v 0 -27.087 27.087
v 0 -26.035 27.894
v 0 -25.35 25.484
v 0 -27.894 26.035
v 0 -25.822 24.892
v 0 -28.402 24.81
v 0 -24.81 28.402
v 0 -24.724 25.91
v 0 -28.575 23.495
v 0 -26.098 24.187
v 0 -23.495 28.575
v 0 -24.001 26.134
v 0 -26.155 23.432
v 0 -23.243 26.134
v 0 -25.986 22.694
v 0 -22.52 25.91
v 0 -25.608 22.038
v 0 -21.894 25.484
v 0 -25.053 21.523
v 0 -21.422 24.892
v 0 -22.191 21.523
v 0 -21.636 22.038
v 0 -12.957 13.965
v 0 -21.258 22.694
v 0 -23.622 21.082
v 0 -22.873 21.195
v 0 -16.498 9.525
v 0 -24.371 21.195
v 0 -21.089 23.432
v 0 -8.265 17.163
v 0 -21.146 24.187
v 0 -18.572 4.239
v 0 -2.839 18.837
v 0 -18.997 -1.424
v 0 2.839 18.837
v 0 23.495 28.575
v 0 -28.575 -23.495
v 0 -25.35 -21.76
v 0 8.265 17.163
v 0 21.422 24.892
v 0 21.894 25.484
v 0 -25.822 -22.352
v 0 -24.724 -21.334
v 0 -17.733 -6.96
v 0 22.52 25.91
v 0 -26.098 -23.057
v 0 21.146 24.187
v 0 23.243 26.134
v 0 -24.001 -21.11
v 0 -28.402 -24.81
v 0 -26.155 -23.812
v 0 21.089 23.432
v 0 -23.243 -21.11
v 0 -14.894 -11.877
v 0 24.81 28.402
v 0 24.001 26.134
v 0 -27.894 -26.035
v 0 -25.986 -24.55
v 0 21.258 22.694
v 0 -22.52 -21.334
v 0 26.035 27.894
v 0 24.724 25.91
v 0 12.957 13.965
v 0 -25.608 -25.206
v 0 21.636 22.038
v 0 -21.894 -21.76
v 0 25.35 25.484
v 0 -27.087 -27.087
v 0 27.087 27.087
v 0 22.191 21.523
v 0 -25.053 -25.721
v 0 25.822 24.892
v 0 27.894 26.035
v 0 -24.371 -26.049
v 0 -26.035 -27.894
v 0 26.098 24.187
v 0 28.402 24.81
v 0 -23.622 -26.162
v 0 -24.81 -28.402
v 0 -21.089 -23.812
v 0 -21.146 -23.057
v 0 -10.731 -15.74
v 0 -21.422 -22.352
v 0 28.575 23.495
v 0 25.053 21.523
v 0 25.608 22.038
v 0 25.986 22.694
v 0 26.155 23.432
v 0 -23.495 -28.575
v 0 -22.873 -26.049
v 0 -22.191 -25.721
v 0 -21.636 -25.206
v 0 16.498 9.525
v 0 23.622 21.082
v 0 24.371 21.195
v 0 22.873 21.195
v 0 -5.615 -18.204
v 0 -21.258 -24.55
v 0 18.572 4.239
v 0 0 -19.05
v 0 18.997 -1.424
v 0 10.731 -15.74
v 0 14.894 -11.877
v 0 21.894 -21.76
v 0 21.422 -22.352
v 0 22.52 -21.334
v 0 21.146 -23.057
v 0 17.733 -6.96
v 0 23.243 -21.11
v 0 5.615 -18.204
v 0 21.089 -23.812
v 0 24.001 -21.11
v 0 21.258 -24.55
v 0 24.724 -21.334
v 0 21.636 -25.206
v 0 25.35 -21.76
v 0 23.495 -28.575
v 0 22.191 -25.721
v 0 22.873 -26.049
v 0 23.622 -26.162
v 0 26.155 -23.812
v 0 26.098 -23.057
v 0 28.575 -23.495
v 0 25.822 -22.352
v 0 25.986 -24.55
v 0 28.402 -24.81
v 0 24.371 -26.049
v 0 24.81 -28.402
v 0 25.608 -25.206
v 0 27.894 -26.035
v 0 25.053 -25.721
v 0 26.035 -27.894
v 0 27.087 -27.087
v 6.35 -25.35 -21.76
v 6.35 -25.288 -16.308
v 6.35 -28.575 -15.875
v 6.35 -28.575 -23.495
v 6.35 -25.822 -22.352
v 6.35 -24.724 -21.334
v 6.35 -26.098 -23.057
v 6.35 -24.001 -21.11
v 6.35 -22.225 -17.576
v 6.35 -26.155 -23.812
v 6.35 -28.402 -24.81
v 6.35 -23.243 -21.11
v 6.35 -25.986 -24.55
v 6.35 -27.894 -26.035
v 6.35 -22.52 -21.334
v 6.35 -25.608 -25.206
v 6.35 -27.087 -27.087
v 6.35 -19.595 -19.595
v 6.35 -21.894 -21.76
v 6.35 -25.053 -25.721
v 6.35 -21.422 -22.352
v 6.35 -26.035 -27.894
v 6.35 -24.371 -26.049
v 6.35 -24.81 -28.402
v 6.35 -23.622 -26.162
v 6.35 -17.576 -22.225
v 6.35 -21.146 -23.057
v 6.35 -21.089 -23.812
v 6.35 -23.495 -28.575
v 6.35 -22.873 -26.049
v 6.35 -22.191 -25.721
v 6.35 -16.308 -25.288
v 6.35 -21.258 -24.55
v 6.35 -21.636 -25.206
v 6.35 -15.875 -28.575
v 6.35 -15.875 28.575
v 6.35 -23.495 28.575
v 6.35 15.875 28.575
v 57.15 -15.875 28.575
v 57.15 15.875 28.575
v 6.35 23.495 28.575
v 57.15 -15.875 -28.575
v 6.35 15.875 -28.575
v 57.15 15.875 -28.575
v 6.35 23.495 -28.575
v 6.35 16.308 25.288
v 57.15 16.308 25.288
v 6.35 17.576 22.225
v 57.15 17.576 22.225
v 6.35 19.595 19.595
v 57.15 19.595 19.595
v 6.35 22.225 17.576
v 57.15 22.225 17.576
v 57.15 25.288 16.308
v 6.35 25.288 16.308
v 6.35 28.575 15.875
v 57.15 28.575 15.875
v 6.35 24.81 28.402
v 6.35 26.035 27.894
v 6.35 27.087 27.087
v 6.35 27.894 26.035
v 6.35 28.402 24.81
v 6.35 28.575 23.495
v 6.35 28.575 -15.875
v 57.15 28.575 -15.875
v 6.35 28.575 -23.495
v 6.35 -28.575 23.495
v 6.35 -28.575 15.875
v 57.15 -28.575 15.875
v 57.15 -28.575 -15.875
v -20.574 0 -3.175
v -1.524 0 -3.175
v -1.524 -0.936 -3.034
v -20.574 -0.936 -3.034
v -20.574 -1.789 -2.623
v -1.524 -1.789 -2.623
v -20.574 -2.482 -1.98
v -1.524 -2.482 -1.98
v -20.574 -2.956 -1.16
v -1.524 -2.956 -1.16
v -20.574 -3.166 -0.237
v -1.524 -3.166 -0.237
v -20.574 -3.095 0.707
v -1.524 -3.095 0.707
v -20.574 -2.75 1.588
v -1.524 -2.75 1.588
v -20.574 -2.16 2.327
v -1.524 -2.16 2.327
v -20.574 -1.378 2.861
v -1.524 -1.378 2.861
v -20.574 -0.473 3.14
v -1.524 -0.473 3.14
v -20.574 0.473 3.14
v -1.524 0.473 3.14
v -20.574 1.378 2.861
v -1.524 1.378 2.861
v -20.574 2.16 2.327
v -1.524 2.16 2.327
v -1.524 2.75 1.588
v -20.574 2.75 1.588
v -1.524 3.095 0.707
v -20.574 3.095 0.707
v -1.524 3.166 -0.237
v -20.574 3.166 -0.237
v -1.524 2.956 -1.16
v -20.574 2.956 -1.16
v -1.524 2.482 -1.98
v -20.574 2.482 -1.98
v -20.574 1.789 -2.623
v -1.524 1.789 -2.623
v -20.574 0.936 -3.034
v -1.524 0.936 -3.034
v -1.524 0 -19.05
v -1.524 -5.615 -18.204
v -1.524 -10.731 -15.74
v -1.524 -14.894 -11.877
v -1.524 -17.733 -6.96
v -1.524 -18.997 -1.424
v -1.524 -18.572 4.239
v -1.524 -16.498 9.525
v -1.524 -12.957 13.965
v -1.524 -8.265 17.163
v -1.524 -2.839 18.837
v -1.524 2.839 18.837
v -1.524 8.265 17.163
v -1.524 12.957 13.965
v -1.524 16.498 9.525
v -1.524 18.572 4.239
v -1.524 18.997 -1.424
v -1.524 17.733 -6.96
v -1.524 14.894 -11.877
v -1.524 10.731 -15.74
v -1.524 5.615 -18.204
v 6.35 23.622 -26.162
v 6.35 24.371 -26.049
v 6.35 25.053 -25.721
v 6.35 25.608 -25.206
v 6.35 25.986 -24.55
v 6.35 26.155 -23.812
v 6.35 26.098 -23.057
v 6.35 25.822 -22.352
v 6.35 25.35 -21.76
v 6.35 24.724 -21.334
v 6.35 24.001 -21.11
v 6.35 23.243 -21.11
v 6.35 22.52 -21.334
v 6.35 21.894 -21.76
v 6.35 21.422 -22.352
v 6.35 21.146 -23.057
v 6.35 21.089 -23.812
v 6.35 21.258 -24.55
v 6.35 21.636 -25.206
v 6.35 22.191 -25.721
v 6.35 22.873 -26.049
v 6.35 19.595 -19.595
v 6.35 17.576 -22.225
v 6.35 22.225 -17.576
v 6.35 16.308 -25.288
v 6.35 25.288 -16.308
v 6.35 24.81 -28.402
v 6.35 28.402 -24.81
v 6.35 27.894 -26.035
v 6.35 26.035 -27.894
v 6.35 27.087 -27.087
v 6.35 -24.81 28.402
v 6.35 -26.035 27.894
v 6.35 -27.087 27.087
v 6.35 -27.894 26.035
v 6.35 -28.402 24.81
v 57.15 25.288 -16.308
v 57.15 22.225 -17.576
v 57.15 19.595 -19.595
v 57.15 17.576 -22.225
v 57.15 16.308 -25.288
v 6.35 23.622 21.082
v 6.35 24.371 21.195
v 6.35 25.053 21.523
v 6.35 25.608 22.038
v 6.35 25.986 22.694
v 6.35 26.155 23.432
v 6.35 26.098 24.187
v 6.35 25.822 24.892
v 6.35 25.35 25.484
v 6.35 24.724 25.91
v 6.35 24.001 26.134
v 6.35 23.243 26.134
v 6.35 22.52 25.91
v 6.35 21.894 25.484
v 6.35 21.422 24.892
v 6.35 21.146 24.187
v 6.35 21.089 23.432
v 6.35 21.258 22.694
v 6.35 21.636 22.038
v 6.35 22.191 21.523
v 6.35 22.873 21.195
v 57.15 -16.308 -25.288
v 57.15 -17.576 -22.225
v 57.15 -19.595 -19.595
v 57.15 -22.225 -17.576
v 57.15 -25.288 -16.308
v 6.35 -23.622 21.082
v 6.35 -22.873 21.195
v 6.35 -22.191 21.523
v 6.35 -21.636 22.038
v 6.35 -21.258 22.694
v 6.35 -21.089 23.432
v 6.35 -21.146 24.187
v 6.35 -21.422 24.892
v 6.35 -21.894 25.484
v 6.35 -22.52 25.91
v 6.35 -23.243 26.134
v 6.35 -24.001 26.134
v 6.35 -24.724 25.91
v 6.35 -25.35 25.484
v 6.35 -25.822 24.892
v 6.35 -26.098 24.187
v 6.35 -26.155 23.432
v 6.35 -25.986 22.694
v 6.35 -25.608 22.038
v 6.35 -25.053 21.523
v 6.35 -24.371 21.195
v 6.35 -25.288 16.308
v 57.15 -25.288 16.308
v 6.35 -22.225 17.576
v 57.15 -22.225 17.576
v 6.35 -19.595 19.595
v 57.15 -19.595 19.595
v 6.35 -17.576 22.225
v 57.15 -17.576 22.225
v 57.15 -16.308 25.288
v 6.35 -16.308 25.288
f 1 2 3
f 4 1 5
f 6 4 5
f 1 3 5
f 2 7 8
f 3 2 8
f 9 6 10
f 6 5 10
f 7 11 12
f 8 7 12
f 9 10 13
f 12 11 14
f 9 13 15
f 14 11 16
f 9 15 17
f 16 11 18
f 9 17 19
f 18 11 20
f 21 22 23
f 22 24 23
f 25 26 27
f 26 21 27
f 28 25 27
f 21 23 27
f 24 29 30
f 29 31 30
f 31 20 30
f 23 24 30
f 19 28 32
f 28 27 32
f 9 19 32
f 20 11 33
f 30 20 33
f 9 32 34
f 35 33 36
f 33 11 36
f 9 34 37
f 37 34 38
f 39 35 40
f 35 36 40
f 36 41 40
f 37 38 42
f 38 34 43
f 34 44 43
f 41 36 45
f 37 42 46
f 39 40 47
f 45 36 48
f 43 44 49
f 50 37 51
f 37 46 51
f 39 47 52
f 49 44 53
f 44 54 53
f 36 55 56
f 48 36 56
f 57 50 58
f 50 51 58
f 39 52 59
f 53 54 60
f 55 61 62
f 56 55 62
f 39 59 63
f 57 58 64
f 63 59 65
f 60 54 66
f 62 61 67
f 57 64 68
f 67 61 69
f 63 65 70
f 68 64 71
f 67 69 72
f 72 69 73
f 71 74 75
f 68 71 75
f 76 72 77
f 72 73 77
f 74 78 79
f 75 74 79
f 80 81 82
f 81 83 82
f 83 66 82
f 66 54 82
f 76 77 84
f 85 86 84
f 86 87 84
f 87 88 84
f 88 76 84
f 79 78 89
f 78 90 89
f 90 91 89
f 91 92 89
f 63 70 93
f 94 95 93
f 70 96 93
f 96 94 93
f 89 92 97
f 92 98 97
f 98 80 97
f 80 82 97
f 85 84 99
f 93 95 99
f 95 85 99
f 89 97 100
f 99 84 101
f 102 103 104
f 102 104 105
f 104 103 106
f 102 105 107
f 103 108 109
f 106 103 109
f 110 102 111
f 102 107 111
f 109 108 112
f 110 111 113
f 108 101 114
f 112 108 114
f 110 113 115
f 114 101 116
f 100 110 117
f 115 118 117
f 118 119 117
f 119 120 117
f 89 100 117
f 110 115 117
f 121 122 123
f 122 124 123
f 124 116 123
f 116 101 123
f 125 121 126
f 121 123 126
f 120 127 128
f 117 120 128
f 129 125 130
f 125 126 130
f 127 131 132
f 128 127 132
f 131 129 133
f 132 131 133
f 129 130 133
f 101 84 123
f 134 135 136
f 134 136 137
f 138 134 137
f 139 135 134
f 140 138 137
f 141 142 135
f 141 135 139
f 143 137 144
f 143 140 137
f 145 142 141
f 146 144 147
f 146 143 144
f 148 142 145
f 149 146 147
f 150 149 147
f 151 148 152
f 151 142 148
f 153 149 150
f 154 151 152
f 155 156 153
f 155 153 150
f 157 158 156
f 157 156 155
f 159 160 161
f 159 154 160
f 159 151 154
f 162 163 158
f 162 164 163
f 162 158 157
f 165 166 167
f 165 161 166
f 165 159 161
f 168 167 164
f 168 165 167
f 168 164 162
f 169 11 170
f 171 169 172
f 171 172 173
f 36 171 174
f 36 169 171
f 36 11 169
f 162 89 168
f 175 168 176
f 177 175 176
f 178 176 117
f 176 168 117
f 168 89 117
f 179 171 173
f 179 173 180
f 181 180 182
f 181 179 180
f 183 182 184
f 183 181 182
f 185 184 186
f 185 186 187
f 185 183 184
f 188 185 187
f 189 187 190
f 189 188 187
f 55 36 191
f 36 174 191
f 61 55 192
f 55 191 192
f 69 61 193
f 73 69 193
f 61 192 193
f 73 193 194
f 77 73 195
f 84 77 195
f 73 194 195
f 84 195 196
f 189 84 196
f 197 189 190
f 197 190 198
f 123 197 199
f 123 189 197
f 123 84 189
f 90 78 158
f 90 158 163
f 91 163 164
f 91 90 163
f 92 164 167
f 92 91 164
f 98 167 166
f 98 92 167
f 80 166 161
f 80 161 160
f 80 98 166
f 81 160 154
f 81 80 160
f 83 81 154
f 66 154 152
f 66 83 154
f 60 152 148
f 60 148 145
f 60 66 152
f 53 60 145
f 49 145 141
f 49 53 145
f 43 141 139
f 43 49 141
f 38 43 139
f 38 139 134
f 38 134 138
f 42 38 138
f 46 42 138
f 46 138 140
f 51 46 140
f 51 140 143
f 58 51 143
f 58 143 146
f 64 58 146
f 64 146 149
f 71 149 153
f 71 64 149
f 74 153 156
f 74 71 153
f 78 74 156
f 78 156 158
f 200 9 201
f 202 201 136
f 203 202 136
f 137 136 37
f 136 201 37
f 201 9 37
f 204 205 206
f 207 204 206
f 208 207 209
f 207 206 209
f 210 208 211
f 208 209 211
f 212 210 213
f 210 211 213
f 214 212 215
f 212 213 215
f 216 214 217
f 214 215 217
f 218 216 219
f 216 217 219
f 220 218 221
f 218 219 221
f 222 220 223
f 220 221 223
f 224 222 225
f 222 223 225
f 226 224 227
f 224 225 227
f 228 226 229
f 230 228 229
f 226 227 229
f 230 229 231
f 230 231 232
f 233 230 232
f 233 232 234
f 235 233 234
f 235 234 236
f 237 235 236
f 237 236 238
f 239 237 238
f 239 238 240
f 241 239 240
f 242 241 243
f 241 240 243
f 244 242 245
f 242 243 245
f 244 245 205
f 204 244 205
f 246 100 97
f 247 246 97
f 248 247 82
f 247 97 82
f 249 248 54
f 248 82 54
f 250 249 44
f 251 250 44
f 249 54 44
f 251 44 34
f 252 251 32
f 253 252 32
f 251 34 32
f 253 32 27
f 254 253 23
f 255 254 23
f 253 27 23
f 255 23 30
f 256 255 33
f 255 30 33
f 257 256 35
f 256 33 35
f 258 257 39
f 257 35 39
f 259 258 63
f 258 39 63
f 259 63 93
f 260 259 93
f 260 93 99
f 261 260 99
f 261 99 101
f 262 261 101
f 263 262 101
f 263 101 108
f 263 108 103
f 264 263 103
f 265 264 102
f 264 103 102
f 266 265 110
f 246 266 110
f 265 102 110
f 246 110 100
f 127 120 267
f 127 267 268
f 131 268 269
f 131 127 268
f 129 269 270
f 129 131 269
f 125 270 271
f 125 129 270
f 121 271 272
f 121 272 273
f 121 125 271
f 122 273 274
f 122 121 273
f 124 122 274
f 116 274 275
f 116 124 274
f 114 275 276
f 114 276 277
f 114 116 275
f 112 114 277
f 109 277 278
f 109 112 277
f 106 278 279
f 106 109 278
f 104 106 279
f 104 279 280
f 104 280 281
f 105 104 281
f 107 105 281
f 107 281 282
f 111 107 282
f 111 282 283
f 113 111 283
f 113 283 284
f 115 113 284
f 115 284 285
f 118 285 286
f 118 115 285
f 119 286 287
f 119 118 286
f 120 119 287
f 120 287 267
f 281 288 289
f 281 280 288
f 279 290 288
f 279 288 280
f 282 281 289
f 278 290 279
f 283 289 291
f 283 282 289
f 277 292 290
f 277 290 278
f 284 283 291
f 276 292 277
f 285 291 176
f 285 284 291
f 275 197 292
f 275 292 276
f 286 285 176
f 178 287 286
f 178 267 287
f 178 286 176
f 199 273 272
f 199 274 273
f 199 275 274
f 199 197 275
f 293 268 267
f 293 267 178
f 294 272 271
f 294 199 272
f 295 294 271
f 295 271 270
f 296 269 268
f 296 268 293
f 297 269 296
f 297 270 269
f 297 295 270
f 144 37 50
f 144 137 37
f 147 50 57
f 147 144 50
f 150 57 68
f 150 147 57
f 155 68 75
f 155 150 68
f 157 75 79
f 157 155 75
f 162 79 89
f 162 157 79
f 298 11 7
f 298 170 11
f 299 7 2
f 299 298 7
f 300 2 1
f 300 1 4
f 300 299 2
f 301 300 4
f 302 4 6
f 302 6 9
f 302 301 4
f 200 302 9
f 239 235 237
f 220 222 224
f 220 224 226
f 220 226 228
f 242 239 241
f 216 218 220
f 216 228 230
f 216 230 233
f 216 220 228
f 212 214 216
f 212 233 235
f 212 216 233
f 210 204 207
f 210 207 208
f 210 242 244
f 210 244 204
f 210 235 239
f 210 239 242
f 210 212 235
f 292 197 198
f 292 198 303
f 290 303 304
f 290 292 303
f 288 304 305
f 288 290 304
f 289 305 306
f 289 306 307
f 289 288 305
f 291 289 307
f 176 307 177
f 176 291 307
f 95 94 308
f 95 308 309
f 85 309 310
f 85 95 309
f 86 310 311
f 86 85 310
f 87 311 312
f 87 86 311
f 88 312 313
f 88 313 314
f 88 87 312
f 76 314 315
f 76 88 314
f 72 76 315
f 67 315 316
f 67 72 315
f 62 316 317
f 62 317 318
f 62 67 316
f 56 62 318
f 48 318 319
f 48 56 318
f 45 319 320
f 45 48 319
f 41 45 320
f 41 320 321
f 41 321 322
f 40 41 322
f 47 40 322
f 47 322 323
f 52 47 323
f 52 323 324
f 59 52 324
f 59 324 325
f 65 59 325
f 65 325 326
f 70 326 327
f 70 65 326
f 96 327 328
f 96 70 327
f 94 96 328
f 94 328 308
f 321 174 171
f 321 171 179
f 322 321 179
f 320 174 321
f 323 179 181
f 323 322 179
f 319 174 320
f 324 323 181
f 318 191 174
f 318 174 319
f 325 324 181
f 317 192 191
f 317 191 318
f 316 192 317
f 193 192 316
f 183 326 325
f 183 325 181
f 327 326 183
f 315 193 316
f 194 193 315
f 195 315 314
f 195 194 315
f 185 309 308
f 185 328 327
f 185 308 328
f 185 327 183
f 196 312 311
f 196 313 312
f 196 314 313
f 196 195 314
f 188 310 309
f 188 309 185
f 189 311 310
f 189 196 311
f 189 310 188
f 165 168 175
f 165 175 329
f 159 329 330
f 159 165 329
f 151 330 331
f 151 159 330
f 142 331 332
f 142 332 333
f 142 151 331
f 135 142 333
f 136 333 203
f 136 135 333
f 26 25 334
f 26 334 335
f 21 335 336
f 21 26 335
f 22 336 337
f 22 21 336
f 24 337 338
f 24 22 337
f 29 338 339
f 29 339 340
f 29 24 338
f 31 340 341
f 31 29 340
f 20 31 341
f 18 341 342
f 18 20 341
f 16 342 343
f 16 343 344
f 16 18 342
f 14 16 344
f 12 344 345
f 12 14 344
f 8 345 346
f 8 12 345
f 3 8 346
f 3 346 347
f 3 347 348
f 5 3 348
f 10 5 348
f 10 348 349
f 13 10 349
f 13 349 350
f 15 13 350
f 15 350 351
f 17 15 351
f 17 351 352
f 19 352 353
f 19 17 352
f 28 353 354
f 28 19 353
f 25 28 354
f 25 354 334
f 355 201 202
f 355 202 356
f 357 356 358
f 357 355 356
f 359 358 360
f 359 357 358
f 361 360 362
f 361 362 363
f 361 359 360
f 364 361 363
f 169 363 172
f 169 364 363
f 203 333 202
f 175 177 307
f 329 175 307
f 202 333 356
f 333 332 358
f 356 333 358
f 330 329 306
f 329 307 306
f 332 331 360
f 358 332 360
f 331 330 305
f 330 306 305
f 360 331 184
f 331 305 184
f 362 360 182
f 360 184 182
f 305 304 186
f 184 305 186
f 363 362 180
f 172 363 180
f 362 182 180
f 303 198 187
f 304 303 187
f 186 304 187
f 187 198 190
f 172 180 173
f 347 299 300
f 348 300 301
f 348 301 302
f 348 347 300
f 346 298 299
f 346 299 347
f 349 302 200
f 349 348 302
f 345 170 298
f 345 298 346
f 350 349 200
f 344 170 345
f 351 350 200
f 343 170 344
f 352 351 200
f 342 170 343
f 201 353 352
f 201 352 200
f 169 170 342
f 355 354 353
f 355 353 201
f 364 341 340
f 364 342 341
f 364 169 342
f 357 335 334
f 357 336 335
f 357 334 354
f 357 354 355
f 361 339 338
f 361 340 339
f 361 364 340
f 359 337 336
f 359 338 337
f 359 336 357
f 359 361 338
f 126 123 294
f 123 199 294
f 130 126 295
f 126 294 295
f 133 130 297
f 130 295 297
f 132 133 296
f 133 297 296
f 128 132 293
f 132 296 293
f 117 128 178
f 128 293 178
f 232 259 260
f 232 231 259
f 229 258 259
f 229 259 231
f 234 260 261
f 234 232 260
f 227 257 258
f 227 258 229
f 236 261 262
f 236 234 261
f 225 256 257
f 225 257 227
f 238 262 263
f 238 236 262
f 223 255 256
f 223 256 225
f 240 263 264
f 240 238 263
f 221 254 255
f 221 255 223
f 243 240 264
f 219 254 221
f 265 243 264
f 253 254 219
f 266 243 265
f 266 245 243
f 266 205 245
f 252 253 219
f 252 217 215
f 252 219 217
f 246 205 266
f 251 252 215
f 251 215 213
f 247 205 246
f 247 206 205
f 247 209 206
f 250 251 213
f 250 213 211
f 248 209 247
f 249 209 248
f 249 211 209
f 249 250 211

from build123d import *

# Parameters (mm, degrees)
SKETCH1_W           = 57.15
SKETCH1_H           = 57.15
SKETCH1_R           = 2.54
BOSS_EXTRUDE1_DEPTH = 6.35
FILLET1_R           = 5.08
SKETCH5_R           = 19.05
BOSS_EXTRUDE4_DEPTH = 1.524
SKETCH6_R           = 3.175
BOSS_EXTRUDE5_DEPTH = 19.05
BOSS_EXTRUDE6_DEPTH = 50.8


with BuildPart() as part:
    # Sketch1 → Boss-Extrude1 (new body)
    with BuildSketch(Plane(origin=(0, 0, 0), x_dir=(0, 0, -1), z_dir=(1, 0, 0))):
        Rectangle(SKETCH1_W, SKETCH1_H)
        with Locations((23.622, 23.622)):
            Circle(SKETCH1_R, mode=Mode.SUBTRACT)
        with Locations((-23.622, 23.622)):
            Circle(SKETCH1_R, mode=Mode.SUBTRACT)
        with Locations((-23.622, -23.622)):
            Circle(SKETCH1_R, mode=Mode.SUBTRACT)
        with Locations((23.622, -23.622)):
            Circle(SKETCH1_R, mode=Mode.SUBTRACT)
    extrude(amount=BOSS_EXTRUDE1_DEPTH)

    # Fillet1
    fillet1_edges = [part.edges().sort_by_distance(p)[0] for p in [
        (3.175, 28.575, 28.575),
        (3.175, 28.575, -28.575),
        (3.175, -28.575, -28.575),
        (3.175, -28.575, 28.575),
    ]]
    fillet(fillet1_edges, radius=FILLET1_R)

    # Sketch5 → Boss-Extrude4 (add)
    with BuildSketch(Plane.ZY):
        with Locations(Location((0, 0, 0), (0, 0, 180))):
            Circle(SKETCH5_R)
    extrude(amount=BOSS_EXTRUDE4_DEPTH)

    # Sketch6 → Boss-Extrude5 (add)
    with BuildSketch(Plane.ZY.offset(1.524)):
        with Locations(Location((0, 0, 0), (0, 0, 180))):
            Circle(SKETCH6_R)
    extrude(amount=BOSS_EXTRUDE5_DEPTH)

    # Sketch7 → Boss-Extrude6 (add)
    with BuildSketch(Plane(origin=(6.35, 0, 0), x_dir=(0, 0, -1), z_dir=(1, 0, 0))):
        with BuildLine():
            Line((-15.875, 28.575), (15.875, 28.575))
            ThreePointArc((15.875, 28.575), (19.594743879, 19.594743879), (28.575, 15.875))
            Line((28.575, 15.875), (28.575, -15.875))
            ThreePointArc((28.575, -15.875), (19.594743879, -19.594743879), (15.875, -28.575))
            Line((15.875, -28.575), (-15.875, -28.575))
            ThreePointArc((-15.875, -28.575), (-19.594743879, -19.594743879), (-28.575, -15.875))
            Line((-28.575, -15.875), (-28.575, 15.875))
            ThreePointArc((-28.575, 15.875), (-19.594743879, 19.594743879), (-15.875, 28.575))
        make_face()
    extrude(amount=BOSS_EXTRUDE6_DEPTH)


solid = part.part
